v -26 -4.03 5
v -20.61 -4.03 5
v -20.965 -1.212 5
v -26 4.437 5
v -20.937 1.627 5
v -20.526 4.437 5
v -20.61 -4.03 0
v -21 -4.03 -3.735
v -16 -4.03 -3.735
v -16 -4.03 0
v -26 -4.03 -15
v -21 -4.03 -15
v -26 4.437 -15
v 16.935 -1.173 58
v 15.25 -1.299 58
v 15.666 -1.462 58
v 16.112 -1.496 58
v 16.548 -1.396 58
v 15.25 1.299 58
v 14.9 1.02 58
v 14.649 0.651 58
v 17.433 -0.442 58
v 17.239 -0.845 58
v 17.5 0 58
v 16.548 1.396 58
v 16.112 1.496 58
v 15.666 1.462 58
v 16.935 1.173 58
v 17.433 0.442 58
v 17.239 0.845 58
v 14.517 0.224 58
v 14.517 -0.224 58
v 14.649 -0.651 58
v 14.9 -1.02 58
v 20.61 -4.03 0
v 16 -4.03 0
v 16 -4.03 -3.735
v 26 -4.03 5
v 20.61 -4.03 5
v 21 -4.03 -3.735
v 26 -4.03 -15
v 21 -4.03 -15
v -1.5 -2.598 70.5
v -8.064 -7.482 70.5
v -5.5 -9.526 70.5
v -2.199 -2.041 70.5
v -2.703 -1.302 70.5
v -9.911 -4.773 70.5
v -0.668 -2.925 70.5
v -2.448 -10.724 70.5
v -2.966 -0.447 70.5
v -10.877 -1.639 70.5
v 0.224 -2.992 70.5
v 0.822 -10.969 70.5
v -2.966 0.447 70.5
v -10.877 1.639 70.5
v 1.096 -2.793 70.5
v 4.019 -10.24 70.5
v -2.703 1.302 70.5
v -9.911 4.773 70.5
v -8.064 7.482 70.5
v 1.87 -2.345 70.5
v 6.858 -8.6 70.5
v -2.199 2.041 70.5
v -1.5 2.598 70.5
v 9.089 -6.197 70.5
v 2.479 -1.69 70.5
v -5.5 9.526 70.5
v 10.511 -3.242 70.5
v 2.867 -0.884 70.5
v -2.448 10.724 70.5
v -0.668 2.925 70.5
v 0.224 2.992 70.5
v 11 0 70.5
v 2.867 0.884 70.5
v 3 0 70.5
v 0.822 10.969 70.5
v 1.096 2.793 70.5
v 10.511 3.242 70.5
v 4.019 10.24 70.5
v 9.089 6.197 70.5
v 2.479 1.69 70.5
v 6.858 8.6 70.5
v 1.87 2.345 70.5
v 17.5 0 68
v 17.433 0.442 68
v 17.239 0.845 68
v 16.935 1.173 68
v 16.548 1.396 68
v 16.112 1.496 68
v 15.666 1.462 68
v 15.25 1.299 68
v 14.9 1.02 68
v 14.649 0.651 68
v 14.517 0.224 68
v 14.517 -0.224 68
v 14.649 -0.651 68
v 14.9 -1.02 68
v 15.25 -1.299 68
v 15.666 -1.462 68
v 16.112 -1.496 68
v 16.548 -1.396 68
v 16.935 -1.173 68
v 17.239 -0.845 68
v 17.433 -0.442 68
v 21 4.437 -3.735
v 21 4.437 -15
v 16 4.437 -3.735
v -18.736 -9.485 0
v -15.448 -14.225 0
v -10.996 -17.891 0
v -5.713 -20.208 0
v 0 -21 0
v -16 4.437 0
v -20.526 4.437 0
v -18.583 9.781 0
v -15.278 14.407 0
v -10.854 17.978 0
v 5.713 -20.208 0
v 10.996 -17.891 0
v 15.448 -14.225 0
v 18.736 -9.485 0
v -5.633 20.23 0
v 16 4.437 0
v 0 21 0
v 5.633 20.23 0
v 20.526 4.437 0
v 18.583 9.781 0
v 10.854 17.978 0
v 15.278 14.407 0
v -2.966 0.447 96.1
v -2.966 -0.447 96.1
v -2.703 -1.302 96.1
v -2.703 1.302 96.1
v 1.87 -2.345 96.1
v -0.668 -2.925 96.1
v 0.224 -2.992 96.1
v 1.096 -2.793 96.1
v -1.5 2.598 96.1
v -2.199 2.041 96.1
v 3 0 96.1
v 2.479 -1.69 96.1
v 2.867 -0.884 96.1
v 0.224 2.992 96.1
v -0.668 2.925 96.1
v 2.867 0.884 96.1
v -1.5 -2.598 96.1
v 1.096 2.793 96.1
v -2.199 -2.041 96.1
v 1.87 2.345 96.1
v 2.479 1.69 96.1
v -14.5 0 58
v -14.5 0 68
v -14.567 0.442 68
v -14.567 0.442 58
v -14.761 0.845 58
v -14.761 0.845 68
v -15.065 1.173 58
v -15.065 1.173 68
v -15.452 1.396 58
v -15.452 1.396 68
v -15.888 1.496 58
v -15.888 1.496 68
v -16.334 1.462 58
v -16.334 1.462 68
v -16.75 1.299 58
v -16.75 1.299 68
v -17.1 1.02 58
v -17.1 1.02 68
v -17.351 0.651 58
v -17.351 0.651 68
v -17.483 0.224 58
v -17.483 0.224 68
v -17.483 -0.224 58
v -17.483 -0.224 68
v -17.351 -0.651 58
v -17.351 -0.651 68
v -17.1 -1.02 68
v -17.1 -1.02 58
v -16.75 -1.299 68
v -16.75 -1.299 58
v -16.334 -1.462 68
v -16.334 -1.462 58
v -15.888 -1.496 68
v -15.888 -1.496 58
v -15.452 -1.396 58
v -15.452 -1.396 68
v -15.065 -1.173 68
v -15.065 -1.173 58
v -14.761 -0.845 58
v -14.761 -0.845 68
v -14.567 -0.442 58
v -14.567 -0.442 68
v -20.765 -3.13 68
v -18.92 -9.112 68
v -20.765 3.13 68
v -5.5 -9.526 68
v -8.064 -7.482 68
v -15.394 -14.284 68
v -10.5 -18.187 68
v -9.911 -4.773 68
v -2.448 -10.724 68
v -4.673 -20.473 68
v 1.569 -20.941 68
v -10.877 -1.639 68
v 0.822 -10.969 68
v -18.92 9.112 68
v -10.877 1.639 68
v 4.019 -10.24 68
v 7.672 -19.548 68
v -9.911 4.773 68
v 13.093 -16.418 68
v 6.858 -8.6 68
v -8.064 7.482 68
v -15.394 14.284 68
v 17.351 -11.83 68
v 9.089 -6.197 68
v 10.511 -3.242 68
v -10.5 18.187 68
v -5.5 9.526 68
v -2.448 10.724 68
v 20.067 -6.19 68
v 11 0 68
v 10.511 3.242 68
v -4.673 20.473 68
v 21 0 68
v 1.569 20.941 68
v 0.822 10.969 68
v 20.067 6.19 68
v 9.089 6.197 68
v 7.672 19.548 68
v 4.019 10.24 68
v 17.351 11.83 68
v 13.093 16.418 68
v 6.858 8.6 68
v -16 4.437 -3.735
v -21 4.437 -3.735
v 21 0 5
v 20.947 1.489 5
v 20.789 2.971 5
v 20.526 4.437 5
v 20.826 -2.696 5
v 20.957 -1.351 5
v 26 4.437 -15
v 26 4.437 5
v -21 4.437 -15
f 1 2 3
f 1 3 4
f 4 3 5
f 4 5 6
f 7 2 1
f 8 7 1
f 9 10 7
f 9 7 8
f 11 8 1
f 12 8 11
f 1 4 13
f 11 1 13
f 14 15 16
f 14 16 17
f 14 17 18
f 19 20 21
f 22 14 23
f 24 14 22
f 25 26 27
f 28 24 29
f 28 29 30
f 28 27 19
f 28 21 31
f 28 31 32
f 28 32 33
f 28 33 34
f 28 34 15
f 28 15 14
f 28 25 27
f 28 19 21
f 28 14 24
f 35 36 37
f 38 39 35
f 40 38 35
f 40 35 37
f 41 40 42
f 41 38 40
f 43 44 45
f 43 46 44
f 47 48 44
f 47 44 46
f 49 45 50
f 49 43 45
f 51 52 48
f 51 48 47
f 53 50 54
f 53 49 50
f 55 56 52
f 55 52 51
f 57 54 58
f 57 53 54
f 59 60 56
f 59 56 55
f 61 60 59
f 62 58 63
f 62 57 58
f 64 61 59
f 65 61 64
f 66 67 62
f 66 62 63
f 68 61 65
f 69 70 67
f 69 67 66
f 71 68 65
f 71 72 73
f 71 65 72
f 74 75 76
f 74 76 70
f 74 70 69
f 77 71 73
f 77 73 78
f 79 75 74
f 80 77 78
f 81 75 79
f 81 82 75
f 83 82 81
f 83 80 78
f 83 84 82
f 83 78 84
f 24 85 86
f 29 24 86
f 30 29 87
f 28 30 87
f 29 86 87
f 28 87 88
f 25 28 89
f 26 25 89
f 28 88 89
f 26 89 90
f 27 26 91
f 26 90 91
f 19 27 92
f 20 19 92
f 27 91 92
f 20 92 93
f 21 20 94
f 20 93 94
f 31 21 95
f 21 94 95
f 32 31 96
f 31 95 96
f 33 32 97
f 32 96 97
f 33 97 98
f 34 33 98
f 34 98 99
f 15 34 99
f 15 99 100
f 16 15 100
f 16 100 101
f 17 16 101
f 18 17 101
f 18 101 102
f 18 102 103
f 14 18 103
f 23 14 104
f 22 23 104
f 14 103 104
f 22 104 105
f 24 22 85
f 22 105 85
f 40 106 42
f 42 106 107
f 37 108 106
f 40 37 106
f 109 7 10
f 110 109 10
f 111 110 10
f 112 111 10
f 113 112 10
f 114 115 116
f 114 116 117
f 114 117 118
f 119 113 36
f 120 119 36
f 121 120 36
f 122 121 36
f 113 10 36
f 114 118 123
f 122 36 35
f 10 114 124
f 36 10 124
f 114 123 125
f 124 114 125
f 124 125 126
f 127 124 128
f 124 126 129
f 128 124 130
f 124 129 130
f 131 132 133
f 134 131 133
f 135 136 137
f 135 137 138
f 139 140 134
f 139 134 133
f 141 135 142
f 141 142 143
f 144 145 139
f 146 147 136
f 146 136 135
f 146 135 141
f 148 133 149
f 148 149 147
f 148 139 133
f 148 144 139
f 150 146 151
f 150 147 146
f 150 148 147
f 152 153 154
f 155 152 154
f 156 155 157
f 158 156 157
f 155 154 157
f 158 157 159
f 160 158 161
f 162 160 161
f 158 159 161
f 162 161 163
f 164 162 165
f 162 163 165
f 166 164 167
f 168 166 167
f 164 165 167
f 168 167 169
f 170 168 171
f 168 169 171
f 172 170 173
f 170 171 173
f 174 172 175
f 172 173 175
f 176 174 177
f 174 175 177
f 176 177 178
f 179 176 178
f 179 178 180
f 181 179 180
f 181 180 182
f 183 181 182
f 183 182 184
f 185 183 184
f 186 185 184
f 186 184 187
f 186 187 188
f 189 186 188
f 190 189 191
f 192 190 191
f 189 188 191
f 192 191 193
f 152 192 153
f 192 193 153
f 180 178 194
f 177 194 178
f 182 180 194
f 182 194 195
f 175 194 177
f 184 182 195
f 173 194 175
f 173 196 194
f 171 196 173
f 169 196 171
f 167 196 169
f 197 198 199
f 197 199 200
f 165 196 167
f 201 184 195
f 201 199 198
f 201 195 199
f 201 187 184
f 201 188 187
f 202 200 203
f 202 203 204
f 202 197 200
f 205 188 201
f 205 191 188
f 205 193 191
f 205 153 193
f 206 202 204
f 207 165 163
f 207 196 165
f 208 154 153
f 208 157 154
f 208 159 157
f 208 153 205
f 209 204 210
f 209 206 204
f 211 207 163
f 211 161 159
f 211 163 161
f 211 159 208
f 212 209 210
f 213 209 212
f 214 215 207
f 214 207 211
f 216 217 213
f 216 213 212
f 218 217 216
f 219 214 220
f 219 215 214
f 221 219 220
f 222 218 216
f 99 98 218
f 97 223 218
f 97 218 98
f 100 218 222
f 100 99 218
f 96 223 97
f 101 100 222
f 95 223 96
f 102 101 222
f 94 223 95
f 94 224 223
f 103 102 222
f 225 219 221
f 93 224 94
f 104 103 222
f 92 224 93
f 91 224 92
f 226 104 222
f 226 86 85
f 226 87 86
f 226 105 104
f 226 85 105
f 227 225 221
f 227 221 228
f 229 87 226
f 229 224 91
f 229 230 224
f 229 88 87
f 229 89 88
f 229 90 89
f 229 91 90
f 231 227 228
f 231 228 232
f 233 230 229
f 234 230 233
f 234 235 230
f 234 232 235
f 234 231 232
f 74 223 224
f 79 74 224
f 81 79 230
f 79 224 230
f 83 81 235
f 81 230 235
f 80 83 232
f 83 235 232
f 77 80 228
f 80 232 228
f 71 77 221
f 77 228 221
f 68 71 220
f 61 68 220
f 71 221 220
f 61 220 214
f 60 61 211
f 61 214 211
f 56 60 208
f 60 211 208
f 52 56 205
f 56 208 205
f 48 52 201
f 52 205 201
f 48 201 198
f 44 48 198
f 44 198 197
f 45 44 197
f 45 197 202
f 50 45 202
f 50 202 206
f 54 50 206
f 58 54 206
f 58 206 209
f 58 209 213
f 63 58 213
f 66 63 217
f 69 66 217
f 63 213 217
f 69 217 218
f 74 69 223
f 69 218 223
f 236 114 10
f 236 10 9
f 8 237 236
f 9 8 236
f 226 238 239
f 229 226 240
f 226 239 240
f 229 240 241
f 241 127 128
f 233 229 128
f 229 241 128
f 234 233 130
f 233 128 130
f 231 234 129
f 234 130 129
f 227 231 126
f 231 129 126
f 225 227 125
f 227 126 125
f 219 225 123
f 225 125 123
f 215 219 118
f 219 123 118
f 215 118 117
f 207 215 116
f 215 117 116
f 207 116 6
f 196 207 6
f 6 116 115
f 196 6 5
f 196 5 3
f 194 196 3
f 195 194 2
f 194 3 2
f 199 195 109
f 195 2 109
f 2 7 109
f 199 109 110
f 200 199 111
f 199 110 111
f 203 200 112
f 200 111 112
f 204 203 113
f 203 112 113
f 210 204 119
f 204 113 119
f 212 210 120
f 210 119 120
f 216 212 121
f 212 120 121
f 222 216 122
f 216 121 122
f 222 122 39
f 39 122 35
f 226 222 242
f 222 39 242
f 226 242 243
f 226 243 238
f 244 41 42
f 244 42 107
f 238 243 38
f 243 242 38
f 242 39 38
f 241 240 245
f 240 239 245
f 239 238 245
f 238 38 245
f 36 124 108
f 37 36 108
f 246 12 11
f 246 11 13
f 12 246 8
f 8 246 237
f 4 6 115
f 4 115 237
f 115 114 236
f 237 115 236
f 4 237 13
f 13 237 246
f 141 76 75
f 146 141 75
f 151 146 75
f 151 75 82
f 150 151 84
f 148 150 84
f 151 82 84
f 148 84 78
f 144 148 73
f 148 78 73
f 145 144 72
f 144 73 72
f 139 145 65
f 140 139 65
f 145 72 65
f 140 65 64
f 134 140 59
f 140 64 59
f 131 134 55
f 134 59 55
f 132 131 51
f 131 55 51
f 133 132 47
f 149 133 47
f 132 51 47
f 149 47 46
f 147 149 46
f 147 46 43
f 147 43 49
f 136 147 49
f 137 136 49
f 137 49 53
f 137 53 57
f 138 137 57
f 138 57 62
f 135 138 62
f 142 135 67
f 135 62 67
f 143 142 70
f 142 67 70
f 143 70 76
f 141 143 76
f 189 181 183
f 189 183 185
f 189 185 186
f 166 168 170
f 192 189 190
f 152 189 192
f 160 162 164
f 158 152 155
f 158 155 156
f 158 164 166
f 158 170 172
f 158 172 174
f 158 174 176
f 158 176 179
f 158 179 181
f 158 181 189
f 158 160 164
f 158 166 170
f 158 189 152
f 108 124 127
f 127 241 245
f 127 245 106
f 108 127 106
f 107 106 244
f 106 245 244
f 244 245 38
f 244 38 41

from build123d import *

# Parameters (mm, degrees)
CROQUIS1_R              = 21
SALIENTE_EXTRUIR1_DEPTH = 68
CROQUIS2_R              = 11
SALIENTE_EXTRUIR2_DEPTH = 2.5
CROQUIS3_R              = 3
SALIENTE_EXTRUIR3_DEPTH = 25.6
CROQUIS4_W              = 20
CROQUIS4_H              = 8.467586068
SALIENTE_EXTRUIR4_DEPTH = 5
CROQUIS6_W              = 20
CROQUIS6_H              = 8.467586068
SALIENTE_EXTRUIR5_DEPTH = 5
CORTAR_EXTRUIR1_DEPTH   = 103.753459728
CROQUIS8_R              = 1.5
CORTAR_EXTRUIR2_DEPTH   = 10


with BuildPart() as part:
    # Croquis1 → Saliente-Extruir1 (new body)
    with BuildSketch(Plane.XY):
        Circle(CROQUIS1_R)
    extrude(amount=SALIENTE_EXTRUIR1_DEPTH)

    # Croquis2 → Saliente-Extruir2 (add)
    with BuildSketch(Plane.XY.offset(68)):
        Circle(CROQUIS2_R)
    extrude(amount=SALIENTE_EXTRUIR2_DEPTH)

    # Croquis3 → Saliente-Extruir3 (add)
    with BuildSketch(Plane.XY.offset(70.5)):
        Circle(CROQUIS3_R)
    extrude(amount=SALIENTE_EXTRUIR3_DEPTH)

    # Croquis4 → Saliente-Extruir4 (add, symmetric)
    with BuildSketch(Plane(origin=(21, 0, 0), x_dir=(0, 0, -1), z_dir=(1, 0, 0))):
        with Locations((5, 0.203649565)):
            Rectangle(CROQUIS4_W, CROQUIS4_H)
    extrude(amount=SALIENTE_EXTRUIR4_DEPTH, both=True)

    # Croquis6 → Saliente-Extruir5 (add, symmetric)
    with BuildSketch(Plane(origin=(-21, 0, 0), x_dir=(0, 0, -1), z_dir=(1, 0, 0))):
        with Locations((5, 0.203649565)):
            Rectangle(CROQUIS6_W, CROQUIS6_H)
    extrude(amount=SALIENTE_EXTRUIR5_DEPTH, both=True)

    # Croquis7 → Cortar-Extruir1 (cut, through all)
    with BuildSketch(Plane(origin=(0, 4.437442599, 0), x_dir=(1, 0, 0), z_dir=(0, 1, 0))):
        Polygon((16, 3.735002253), (21, 3.735002253), (21, 15), (-21, 15), (-21, 3.735002253), align=None)
    extrude(amount=-CORTAR_EXTRUIR1_DEPTH, mode=Mode.SUBTRACT)

    # Croquis8 → Cortar-Extruir2 (cut)
    with BuildSketch(Plane.XY.offset(68)):
        with Locations((-16, 0)):
            Circle(CROQUIS8_R)
        with Locations((16, 0)):
            Circle(CROQUIS8_R)
    extrude(amount=-CORTAR_EXTRUIR2_DEPTH, mode=Mode.SUBTRACT)


solid = part.part
